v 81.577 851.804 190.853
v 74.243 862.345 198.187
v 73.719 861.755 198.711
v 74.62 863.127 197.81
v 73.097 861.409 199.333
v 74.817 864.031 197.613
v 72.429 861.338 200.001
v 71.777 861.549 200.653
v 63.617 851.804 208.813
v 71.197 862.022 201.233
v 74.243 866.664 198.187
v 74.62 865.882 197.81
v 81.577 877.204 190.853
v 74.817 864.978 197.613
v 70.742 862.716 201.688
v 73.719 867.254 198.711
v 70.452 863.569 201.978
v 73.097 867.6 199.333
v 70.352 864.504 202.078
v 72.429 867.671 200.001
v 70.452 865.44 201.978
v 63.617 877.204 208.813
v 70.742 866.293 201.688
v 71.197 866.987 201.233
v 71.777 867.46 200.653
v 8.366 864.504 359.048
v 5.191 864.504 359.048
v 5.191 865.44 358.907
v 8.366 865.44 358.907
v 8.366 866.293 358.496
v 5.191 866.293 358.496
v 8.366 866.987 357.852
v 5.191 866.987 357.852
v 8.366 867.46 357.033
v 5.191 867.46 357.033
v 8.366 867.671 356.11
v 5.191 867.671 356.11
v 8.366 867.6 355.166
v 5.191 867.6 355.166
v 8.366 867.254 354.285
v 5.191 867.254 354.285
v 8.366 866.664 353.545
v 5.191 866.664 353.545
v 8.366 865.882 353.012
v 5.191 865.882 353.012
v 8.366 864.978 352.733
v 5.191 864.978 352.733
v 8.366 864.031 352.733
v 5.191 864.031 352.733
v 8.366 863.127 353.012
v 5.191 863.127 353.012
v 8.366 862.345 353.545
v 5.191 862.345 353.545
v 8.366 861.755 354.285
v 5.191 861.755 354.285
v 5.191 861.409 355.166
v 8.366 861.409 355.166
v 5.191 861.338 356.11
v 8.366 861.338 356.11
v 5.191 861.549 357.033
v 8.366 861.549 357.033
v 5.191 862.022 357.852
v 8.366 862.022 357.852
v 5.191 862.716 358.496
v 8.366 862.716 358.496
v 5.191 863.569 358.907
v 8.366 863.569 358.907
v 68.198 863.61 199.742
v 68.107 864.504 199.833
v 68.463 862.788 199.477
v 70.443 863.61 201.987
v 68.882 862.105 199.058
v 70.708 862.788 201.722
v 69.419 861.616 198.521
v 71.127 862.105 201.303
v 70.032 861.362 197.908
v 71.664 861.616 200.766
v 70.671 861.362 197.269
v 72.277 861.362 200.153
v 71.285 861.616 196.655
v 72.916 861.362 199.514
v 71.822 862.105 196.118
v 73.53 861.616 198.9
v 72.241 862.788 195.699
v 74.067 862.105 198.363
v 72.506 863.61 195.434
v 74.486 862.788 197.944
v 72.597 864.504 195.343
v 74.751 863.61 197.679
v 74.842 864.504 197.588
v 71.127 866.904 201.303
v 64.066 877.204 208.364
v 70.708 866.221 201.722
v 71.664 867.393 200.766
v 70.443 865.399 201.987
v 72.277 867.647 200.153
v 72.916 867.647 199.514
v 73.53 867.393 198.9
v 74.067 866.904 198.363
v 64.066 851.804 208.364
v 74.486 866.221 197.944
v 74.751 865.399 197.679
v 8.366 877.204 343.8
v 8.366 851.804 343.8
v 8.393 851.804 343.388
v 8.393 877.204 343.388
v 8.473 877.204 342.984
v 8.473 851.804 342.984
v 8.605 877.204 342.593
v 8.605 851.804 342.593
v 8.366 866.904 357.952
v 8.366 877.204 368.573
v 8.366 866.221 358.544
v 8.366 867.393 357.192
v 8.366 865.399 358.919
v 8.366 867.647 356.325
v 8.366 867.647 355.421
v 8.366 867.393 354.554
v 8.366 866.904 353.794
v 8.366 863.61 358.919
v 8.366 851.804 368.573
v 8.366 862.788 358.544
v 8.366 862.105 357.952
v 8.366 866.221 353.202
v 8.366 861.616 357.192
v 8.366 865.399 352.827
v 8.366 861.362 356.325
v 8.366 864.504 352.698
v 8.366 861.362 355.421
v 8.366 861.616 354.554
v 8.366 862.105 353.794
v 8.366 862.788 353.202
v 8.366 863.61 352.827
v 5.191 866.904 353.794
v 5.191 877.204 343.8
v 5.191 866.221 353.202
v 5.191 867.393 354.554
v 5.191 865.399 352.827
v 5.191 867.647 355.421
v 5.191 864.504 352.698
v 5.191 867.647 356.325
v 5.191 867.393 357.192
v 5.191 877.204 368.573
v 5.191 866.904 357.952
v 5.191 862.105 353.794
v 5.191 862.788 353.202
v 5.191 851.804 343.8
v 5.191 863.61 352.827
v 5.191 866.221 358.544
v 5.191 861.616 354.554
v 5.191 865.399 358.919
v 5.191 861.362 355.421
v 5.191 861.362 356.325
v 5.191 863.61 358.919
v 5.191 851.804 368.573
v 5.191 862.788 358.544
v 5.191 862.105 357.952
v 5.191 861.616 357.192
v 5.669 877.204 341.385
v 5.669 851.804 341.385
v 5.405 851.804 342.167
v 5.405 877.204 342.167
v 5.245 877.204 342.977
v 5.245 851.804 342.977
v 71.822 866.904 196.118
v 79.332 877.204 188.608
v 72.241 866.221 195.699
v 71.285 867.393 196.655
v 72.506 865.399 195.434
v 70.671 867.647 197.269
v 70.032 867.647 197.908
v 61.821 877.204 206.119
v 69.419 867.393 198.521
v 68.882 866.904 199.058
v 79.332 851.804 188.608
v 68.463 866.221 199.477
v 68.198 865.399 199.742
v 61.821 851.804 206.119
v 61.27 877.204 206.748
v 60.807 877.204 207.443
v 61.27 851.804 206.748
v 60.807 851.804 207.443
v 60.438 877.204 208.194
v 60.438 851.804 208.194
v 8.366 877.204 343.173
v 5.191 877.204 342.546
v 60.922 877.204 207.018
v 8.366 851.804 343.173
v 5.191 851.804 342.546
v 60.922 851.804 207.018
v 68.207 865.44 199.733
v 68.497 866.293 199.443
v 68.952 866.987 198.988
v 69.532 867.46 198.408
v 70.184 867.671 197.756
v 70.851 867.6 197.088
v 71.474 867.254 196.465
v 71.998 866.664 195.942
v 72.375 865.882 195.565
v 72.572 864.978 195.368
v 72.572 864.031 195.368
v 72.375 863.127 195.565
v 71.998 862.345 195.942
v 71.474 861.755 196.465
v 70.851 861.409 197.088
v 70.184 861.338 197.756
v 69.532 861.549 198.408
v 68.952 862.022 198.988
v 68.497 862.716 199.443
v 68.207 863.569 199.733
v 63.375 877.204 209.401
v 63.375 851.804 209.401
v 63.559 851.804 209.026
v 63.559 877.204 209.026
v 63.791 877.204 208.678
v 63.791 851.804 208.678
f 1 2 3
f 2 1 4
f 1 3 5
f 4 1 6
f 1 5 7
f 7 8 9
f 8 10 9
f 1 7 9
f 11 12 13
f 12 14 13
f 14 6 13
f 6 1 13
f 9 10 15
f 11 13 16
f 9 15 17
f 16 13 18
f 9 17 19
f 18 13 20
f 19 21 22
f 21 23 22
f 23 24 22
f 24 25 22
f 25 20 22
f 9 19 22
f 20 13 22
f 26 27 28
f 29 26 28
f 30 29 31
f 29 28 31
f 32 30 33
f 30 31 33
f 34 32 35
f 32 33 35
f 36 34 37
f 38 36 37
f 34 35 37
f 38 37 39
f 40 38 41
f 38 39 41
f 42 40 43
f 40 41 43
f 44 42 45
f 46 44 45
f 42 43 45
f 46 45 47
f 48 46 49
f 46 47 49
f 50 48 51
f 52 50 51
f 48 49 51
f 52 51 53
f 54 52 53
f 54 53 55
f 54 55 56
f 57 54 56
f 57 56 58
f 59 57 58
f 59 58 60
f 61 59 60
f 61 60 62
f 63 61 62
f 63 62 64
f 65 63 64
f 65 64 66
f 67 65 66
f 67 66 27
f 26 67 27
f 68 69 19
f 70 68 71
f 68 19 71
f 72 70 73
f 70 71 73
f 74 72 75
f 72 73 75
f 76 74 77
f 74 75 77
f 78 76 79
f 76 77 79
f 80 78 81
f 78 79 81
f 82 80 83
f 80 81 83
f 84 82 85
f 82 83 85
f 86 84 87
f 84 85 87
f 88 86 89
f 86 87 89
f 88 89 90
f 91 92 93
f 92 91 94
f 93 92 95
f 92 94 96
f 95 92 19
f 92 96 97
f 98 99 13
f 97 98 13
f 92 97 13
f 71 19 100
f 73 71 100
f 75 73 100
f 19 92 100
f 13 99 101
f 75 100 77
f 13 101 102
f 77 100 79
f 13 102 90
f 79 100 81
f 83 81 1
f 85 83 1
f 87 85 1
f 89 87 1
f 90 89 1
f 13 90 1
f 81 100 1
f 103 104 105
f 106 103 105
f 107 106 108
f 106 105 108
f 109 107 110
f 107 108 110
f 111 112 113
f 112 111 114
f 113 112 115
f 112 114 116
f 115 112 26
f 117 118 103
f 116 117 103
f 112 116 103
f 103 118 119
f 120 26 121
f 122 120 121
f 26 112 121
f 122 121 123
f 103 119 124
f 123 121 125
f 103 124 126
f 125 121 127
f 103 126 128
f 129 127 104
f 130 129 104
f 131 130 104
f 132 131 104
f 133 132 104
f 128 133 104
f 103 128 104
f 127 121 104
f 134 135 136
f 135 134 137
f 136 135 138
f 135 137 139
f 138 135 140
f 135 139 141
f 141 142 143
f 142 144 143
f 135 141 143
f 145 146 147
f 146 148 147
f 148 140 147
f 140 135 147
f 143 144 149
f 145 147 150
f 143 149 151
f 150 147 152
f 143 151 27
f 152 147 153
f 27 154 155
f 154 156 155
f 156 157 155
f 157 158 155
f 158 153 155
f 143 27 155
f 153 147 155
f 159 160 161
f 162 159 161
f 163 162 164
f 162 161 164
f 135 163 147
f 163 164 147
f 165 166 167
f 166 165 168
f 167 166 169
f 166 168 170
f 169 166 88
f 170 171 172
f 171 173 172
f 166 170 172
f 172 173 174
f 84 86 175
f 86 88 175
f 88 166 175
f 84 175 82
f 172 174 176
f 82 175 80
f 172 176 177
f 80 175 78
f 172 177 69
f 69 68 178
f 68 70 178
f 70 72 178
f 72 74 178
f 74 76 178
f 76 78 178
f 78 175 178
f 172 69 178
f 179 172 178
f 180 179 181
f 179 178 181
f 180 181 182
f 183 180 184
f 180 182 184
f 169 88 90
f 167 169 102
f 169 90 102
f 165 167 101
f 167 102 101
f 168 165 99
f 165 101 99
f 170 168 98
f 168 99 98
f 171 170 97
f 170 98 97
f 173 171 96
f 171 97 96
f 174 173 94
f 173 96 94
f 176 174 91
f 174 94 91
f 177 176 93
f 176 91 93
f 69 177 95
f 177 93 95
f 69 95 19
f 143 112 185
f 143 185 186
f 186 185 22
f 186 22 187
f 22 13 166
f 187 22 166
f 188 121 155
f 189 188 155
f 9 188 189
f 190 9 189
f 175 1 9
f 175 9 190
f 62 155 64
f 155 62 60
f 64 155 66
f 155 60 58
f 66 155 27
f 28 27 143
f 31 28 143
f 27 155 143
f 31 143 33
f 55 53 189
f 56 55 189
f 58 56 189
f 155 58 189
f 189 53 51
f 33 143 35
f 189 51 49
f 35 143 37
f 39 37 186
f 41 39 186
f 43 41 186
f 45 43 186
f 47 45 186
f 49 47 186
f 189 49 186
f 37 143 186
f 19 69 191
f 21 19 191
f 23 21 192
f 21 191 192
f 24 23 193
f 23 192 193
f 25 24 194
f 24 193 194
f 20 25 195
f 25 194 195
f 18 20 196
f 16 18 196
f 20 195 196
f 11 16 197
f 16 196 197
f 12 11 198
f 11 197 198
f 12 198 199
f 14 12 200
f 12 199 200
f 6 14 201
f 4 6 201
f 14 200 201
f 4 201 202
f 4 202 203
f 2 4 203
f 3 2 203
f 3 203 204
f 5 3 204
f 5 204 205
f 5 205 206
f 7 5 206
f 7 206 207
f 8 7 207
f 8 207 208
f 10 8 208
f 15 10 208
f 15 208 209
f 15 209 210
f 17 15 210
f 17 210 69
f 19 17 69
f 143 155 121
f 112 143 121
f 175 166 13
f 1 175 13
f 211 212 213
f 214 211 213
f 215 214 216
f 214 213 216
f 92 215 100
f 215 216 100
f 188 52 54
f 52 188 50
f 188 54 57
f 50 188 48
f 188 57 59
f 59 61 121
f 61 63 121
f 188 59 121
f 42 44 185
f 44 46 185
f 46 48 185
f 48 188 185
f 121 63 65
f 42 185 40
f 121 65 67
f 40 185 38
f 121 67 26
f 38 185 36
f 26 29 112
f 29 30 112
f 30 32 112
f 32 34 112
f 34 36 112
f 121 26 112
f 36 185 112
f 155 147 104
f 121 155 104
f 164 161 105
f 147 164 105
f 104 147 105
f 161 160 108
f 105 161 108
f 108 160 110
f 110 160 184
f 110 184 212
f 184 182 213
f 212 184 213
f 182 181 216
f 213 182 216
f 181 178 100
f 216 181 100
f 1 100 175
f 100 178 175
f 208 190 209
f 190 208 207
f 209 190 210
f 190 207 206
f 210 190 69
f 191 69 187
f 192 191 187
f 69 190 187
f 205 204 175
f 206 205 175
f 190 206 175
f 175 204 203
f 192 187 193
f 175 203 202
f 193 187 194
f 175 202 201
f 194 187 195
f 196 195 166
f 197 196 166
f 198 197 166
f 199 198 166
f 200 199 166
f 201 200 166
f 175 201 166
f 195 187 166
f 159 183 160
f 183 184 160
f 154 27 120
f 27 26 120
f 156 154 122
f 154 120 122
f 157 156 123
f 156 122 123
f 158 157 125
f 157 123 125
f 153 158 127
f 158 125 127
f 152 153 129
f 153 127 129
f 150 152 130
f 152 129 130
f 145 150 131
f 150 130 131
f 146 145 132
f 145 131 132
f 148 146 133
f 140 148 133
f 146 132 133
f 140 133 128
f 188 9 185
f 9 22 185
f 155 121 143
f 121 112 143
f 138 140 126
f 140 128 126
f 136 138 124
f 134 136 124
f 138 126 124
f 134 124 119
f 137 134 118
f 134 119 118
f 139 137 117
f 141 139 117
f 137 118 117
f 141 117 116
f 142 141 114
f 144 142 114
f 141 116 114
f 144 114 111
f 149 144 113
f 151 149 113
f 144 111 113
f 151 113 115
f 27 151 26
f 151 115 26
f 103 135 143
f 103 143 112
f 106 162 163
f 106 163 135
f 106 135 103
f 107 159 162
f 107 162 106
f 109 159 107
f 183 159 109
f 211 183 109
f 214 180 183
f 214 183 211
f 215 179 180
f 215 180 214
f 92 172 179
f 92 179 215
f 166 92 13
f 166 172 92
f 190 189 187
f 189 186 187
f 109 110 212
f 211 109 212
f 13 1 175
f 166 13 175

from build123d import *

# Parameters (mm, degrees)
EXTRUDE_THIN1_DEPTH    = 12.7
SKETCH3_R              = 3.175
CUT_EXTRUDE1_DEPTH     = 955.551399154
SKETCH2_R              = 3.175
CUT_EXTRUDE2_DEPTH     = 918.120523582
CONVERT_SOLID1_START   = 851.804423502
CONVERT_SOLID1_DEPTH   = 9.5249999
CONVERT_SOLID1_START_2 = 867.679423602
CONVERT_SOLID1_2_DEPTH = 9.5249999
CONVERT_SOLID1_START_3 = 861.329423402
CONVERT_SOLID1_3_DEPTH = 6.3500002


with BuildPart() as part:
    # Sketch1 → Extrude-Thin1 (new, symmetric)
    with BuildSketch(Plane(origin=(0, 864.504423502, 0), x_dir=(1, 0, 0), z_dir=(0, 1, 0))):
        Polygon((81.577207348, -190.852816746), (63.616695106, -208.813328988), (8.366428726, -343.172904376), (8.366428726, -368.572904376), (5.191428726, -368.572904376), (5.191428726, -342.545589137), (60.922066406, -207.017829627), (79.332143317, -188.607752715), align=None)
    extrude(amount=EXTRUDE_THIN1_DEPTH, both=True)

    # Sketch3 → Cut-Extrude1 (cut, through all)
    with BuildSketch(Plane.ZY.offset(-5.191428726)):
        with Locations((355.872904376, 864.504423502)):
            Circle(SKETCH3_R)
    extrude(amount=-CUT_EXTRUDE1_DEPTH, mode=Mode.SUBTRACT)

    # Sketch2 → Cut-Extrude2 (cut, through all)
    with BuildSketch(Plane(origin=(133.969948016, 0, 133.969948016), x_dir=(-0.7071067811865468, 0, 0.7071067811865483), z_dir=(-0.7071067811865483, 0, -0.7071067811865468))):
        with Locations((89.969524424, 864.504423502)):
            Circle(SKETCH2_R)
    extrude(amount=-CUT_EXTRUDE2_DEPTH, mode=Mode.SUBTRACT)


with BuildPart() as body_2:
    # Convert-Solid1: read off the stored shape, not the designer's step
    # Convert-Solid1 outline → Convert-Solid1 (new body)
    with BuildSketch(Plane(origin=(0, 0, 0), x_dir=(1, 0, 0), z_dir=(0, 1, 0)).offset(CONVERT_SOLID1_START)):
        with BuildLine():
            Line((81.577207348, -190.852816746), (79.332143317, -188.607752715))
            Line((79.332143317, -188.607752715), (61.821195745, -206.118700288))
            ThreePointArc((61.821195745, -206.118700288), (61.02697209, -207.087730942), (60.438475677, -208.19384287))
            Line((60.438475677, -208.19384287), (5.668580598, -341.385234136))
            ThreePointArc((5.668580598, -341.385234136), (5.311858692, -342.569383642), (5.191428726, -343.800219615))
            Line((5.191428726, -343.800219615), (5.191428726, -368.572904376))
            Line((5.191428726, -368.572904376), (8.366428726, -368.572904376))
            Line((8.366428726, -368.572904376), (8.366428726, -343.800219615))
            ThreePointArc((8.366428726, -343.800219615), (8.426643709, -343.184801628), (8.605004662, -342.592726875))
            Line((8.605004662, -342.592726875), (63.374899742, -209.401335609))
            ThreePointArc((63.374899742, -209.401335609), (63.669147948, -208.848279645), (64.066259775, -208.363764318))
            Line((64.066259775, -208.363764318), (81.577207348, -190.852816746))
        make_face()
    extrude(amount=CONVERT_SOLID1_DEPTH)

    # Convert-Solid1 2 outline → Convert-Solid1 2 (add)
    with BuildSketch(Plane(origin=(0, 0, 0), x_dir=(1, 0, 0), z_dir=(0, 1, 0)).offset(CONVERT_SOLID1_START_2)):
        with BuildLine():
            Line((81.577207348, -190.852816746), (79.332143317, -188.607752715))
            Line((79.332143317, -188.607752715), (61.821195745, -206.118700288))
            ThreePointArc((61.821195745, -206.118700288), (61.02697209, -207.087730942), (60.438475677, -208.19384287))
            Line((60.438475677, -208.19384287), (5.668580598, -341.385234136))
            ThreePointArc((5.668580598, -341.385234136), (5.311858692, -342.569383642), (5.191428726, -343.800219615))
            Line((5.191428726, -343.800219615), (5.191428726, -368.572904376))
            Line((5.191428726, -368.572904376), (8.366428726, -368.572904376))
            Line((8.366428726, -368.572904376), (8.366428726, -343.800219615))
            ThreePointArc((8.366428726, -343.800219615), (8.426643709, -343.184801628), (8.605004662, -342.592726875))
            Line((8.605004662, -342.592726875), (63.374899742, -209.401335609))
            ThreePointArc((63.374899742, -209.401335609), (63.669147948, -208.848279645), (64.066259775, -208.363764318))
            Line((64.066259775, -208.363764318), (81.577207348, -190.852816746))
        make_face()
    extrude(amount=CONVERT_SOLID1_2_DEPTH)

    # Convert-Solid1 3 outline → Convert-Solid1 3 (add)
    with BuildSketch(Plane(origin=(0, 0, 0), x_dir=(1, 0, 0), z_dir=(0, 1, 0)).offset(CONVERT_SOLID1_START_3)):
        with BuildLine():
            Line((81.577207348, -190.852816746), (79.332143317, -188.607752715))
            Line((79.332143317, -188.607752715), (61.821195745, -206.118700288))
            ThreePointArc((61.821195745, -206.118700288), (61.02697209, -207.087730942), (60.438475677, -208.19384287))
            Line((60.438475677, -208.19384287), (5.668580598, -341.385234136))
            ThreePointArc((5.668580598, -341.385234136), (5.311858692, -342.569383642), (5.191428726, -343.800219615))
            Line((5.191428726, -343.800219615), (5.191428726, -368.572904376))
            Line((5.191428726, -368.572904376), (8.366428726, -368.572904376))
            Line((8.366428726, -368.572904376), (8.366428726, -343.800219615))
            ThreePointArc((8.366428726, -343.800219615), (8.426643709, -343.184801628), (8.605004662, -342.592726875))
            Line((8.605004662, -342.592726875), (63.374899742, -209.401335609))
            ThreePointArc((63.374899742, -209.401335609), (63.669147948, -208.848279645), (64.066259775, -208.363764318))
            Line((64.066259775, -208.363764318), (81.577207348, -190.852816746))
        make_face()
    extrude(amount=CONVERT_SOLID1_3_DEPTH)

    # Convert-Solid1 4: loft between two sections, ruled curve by curve
    convert_solid1_4_from = [
        Edge.make_three_point_arc((72.596951227, 864.504423502, 195.342944806), (70.351887196, 867.679423502, 197.588008837), (68.106823166, 864.504423502, 199.833072867)),
        Edge.make_three_point_arc((68.106823166, 864.504423502, 199.833072867), (70.351887196, 861.329423502, 197.588008837), (72.596951227, 864.504423502, 195.342944806)),
    ]
    convert_solid1_4_to = [
        Edge.make_three_point_arc((74.842015257, 864.504423502, 197.588008837), (72.596951227, 867.679423502, 199.833072867), (70.351887196, 864.504423502, 202.078136897)),
        Edge.make_three_point_arc((70.351887196, 864.504423502, 202.078136897), (72.596951227, 861.329423502, 199.833072867), (74.842015257, 864.504423502, 197.588008837)),
    ]
    convert_solid1_4 = Solid(Shell([*[Face.make_surface_from_curves(convert_solid1_4_from[k], convert_solid1_4_to[k]) for k in range(2)], Face(Wire(convert_solid1_4_from)), Face(Wire(convert_solid1_4_to))]))
    add(convert_solid1_4, mode=Mode.SUBTRACT)

    # Convert-Solid1 5: loft between two sections, ruled curve by curve
    convert_solid1_5_from = [
        Edge.make_three_point_arc((5.191428726, 864.504423502, 352.697904376), (5.191428726, 867.679423502, 355.872904376), (5.191428726, 864.504423502, 359.047904376)),
        Edge.make_three_point_arc((5.191428726, 864.504423502, 359.047904376), (5.191428726, 861.329423502, 355.872904376), (5.191428726, 864.504423502, 352.697904376)),
    ]
    convert_solid1_5_to = [
        Edge.make_three_point_arc((8.366428726, 864.504423502, 352.697904376), (8.366428726, 867.679423502, 355.872904376), (8.366428726, 864.504423502, 359.047904376)),
        Edge.make_three_point_arc((8.366428726, 864.504423502, 359.047904376), (8.366428726, 861.329423502, 355.872904376), (8.366428726, 864.504423502, 352.697904376)),
    ]
    convert_solid1_5 = Solid(Shell([*[Face.make_surface_from_curves(convert_solid1_5_from[k], convert_solid1_5_to[k]) for k in range(2)], Face(Wire(convert_solid1_5_from)), Face(Wire(convert_solid1_5_to))]))
    add(convert_solid1_5, mode=Mode.SUBTRACT)


solid = Compound([part.part, body_2.part])
